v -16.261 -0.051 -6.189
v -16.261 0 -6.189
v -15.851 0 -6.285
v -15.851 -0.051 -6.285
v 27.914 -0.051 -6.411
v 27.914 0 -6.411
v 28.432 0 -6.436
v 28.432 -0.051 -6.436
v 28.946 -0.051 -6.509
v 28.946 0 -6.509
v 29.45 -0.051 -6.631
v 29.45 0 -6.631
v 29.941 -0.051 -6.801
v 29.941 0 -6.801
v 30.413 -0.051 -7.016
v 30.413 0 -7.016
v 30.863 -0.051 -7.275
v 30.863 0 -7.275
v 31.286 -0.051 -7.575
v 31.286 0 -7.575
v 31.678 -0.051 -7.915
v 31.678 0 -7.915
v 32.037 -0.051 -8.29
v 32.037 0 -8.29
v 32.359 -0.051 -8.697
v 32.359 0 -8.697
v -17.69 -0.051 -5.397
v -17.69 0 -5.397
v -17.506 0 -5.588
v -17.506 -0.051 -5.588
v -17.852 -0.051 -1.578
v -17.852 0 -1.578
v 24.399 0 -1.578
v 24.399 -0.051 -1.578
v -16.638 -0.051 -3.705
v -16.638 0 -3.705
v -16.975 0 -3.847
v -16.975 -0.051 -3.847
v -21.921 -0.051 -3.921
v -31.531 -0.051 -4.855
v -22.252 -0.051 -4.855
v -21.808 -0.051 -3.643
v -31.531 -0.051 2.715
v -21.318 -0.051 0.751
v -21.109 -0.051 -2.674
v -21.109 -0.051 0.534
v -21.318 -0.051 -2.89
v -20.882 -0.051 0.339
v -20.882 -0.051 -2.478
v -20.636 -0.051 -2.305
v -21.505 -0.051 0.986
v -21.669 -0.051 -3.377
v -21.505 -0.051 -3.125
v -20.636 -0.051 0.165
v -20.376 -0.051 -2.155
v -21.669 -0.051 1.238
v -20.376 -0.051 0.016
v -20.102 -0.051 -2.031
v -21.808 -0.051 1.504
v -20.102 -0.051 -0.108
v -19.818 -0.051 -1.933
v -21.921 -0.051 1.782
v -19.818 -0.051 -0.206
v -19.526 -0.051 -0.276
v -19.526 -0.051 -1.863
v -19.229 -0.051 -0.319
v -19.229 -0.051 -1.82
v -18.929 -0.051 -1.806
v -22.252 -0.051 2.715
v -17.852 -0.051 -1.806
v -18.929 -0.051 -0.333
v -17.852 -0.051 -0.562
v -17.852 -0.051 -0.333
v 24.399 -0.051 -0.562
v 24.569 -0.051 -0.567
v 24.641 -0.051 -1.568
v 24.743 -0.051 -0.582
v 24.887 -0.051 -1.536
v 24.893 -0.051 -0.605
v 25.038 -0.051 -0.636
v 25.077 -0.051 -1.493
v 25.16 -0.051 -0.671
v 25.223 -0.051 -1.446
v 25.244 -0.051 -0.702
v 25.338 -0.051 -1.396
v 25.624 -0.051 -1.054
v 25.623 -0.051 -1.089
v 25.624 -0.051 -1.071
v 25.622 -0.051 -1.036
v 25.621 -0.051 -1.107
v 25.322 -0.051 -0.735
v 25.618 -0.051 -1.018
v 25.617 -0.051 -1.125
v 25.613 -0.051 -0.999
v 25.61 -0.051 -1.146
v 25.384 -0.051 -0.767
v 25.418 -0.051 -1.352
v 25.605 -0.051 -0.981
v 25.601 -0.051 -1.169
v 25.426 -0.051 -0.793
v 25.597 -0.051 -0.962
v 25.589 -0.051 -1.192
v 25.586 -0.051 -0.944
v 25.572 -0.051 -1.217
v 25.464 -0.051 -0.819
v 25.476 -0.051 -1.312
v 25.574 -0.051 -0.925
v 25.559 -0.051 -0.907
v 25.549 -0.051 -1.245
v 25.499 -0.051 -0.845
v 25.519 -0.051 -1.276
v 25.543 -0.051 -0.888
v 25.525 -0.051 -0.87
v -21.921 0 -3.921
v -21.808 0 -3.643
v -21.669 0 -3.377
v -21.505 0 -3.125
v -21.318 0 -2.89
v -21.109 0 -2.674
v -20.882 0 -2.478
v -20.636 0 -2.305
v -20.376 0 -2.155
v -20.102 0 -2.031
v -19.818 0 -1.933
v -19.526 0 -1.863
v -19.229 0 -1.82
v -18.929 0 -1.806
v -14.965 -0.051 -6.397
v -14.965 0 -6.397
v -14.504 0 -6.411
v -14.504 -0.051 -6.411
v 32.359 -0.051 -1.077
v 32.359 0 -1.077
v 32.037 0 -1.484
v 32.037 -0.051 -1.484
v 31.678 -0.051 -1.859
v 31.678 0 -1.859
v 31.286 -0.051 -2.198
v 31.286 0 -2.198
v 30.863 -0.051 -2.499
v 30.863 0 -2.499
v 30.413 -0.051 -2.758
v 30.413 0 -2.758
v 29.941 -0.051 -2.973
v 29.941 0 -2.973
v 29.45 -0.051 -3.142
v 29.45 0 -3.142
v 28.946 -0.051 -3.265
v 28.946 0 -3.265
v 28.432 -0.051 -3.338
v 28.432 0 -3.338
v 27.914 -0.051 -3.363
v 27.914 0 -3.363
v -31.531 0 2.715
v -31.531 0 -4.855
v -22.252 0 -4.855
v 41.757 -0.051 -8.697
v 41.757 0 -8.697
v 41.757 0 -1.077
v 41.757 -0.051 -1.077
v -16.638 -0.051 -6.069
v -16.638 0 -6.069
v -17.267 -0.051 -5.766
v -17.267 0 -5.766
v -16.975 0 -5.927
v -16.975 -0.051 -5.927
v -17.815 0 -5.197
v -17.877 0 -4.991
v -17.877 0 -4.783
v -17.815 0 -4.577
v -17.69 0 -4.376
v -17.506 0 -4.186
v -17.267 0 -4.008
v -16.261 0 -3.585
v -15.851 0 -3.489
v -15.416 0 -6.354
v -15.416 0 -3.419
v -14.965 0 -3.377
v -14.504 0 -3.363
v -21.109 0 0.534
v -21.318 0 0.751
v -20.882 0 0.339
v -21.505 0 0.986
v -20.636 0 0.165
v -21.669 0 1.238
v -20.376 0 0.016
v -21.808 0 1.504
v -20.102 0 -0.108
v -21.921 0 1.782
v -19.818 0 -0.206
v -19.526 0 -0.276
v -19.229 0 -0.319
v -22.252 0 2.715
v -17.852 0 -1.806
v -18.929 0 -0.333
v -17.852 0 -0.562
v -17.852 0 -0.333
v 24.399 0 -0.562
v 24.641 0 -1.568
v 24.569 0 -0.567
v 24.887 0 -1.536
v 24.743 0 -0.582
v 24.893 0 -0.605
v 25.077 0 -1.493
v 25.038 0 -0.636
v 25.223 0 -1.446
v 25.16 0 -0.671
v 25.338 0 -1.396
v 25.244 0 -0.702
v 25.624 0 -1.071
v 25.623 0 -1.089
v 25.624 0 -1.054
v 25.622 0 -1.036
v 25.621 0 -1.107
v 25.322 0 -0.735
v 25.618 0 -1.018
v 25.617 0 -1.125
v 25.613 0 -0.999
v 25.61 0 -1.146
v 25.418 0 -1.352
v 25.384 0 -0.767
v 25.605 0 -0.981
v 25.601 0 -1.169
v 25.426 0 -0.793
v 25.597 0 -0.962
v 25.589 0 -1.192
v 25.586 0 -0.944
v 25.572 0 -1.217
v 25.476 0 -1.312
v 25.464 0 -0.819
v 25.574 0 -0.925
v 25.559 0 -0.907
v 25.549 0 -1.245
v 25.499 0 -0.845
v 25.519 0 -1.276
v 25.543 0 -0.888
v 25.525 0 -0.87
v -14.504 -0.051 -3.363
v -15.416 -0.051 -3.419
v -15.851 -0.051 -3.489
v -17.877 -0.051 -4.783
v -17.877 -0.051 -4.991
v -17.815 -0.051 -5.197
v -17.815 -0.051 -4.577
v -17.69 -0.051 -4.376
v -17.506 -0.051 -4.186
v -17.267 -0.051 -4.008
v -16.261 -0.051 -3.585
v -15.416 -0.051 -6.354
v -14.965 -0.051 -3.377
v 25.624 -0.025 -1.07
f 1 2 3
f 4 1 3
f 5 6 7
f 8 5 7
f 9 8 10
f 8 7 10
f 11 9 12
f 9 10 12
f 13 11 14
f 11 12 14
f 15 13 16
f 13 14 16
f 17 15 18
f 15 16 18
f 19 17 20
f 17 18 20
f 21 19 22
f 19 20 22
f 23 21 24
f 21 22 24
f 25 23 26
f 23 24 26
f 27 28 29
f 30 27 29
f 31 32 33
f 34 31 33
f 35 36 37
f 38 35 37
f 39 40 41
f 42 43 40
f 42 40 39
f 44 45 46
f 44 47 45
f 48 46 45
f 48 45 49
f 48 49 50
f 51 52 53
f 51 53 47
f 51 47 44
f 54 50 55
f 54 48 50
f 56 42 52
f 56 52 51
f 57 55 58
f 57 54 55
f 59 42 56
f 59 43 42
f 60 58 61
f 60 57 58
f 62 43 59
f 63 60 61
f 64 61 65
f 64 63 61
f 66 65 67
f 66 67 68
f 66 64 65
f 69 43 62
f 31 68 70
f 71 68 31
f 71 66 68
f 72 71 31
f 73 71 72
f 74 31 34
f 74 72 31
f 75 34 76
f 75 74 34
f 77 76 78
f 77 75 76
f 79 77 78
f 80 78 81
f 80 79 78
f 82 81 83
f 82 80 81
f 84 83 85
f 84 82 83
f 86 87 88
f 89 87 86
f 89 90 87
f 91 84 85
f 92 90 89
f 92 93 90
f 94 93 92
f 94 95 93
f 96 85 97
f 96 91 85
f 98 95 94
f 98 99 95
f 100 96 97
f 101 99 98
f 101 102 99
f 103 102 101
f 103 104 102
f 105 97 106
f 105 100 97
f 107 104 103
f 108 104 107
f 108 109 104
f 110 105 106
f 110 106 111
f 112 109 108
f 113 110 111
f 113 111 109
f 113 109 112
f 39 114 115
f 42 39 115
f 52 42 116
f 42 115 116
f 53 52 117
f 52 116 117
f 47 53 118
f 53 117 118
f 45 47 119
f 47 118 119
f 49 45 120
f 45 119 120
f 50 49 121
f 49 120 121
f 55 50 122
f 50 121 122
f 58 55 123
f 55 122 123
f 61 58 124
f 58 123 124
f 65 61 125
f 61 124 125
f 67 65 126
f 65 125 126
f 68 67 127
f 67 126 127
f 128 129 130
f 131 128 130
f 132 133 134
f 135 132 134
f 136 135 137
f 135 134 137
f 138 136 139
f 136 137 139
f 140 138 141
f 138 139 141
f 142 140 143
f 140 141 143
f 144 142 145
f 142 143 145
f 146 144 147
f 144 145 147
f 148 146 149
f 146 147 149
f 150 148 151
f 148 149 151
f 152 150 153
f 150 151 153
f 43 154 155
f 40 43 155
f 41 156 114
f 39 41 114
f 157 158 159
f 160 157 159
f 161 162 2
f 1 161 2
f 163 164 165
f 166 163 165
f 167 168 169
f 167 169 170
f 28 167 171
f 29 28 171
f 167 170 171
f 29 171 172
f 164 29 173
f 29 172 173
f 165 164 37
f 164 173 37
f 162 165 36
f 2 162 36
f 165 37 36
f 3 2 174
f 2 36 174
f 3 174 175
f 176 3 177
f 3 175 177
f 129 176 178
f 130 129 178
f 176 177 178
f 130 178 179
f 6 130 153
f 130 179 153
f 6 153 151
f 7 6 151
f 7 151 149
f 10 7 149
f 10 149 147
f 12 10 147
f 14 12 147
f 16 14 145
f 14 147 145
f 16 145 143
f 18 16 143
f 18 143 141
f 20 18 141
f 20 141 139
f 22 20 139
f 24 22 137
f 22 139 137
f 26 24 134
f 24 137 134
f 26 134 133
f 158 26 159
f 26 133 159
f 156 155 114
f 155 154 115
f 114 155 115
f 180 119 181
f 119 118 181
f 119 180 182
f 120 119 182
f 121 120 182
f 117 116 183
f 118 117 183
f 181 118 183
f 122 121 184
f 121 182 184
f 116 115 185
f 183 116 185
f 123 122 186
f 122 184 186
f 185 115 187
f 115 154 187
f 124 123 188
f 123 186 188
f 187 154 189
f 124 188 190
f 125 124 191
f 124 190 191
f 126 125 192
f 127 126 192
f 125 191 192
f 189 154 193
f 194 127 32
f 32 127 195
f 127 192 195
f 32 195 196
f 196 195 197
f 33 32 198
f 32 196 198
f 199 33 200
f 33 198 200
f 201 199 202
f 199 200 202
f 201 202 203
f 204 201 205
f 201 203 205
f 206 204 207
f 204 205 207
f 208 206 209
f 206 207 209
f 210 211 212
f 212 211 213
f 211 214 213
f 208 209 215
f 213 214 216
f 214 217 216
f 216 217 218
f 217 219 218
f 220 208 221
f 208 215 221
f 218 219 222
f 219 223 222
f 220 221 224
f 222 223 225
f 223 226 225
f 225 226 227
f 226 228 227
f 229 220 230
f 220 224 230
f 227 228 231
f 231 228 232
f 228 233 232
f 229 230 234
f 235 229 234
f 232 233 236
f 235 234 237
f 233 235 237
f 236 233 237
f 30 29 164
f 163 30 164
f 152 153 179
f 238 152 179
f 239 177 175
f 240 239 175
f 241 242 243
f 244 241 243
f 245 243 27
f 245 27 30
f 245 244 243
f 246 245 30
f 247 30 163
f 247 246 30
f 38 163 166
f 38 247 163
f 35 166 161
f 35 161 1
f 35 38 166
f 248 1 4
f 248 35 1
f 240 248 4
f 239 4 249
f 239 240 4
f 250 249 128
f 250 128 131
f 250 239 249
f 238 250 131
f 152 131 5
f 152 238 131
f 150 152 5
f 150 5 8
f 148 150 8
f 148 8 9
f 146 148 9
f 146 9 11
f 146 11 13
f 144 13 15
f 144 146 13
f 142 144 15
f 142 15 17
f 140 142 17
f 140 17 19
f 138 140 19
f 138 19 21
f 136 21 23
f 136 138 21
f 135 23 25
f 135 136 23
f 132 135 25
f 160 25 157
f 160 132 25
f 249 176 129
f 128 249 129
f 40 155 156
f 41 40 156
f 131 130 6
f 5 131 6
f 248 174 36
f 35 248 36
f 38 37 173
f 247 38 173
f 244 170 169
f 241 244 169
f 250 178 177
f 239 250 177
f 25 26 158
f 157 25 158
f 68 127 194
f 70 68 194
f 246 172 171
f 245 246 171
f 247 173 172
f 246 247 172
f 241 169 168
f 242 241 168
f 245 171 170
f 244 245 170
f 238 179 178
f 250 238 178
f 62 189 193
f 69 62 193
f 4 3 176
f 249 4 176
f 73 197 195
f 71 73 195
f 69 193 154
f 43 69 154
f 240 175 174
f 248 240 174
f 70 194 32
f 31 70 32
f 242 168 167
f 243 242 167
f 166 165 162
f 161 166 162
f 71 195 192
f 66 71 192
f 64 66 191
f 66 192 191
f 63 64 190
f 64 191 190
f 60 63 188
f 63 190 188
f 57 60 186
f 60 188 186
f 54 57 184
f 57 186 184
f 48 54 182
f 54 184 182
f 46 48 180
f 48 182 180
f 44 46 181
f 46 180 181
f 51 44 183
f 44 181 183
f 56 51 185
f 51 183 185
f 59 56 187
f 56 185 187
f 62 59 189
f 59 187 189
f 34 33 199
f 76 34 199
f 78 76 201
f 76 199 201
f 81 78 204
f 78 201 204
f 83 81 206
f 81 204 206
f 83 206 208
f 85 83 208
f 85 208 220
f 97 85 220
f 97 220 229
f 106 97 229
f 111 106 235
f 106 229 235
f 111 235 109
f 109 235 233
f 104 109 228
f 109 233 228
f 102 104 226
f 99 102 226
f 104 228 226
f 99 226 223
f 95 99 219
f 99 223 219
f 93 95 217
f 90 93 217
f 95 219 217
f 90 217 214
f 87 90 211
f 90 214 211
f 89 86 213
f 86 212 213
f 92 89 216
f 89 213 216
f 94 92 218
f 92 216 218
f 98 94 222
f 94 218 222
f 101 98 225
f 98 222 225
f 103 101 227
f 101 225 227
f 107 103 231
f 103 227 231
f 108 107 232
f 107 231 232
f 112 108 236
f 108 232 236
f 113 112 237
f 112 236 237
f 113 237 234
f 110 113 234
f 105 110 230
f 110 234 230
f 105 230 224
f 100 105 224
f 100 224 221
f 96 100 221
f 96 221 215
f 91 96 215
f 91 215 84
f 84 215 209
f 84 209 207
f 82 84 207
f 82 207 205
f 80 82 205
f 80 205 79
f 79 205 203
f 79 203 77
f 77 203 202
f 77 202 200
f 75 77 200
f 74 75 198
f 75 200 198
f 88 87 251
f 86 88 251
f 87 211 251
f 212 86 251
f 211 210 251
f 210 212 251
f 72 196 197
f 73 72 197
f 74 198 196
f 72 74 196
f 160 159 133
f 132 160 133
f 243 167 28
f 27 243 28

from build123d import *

# Parameters (mm, degrees)
F2_DEPTH = 0.0508


# Not quite as in the source:
# - ends of sketch curves that miss each other by under 0.0002 mm in the source are joined


with BuildPart() as f2:
    # F0 (on Front) → F2 (new body)
    with BuildSketch(Plane.XZ):
        with BuildLine():
            Line((-22.2519018109, 2.7154037545), (-31.5314531326, 2.7154037545))
            Line((-31.5314531326, 2.7154037545), (-31.5314531326, -4.8547233455))
            Line((-31.5314531326, -4.8547233455), (-22.2519018109, -4.8547233455))
            Line((-22.2519018109, -4.8547233455), (-21.9214119342, -3.9214320238))
            ThreePointArc((-21.9214119342, -3.9214320238), (-20.7609625105, -2.3884201716), (-18.9285192327, -1.8062519505))
            Line((-18.9285192327, -1.8062519505), (-17.8517878327, -1.8062519505))
            Line((-17.8517878327, -1.8062519505), (-17.8517878327, -1.577656713))
            Line((-17.8517878327, -1.577656713), (24.3993468673, -1.577656713))
            add(Edge.make_bspline(
                [(24.3993468673, -1.577656713), (25.6243397865, -1.577656713), (25.6243397865, -1.0696597955), (25.6243397865, -0.5616628779), (24.3993468673, -0.5616628779)],
                knots=[4.7123889804, 4.7123889804, 4.7123889804, 6.2831853072, 6.2831853072, 7.853981634, 7.853981634, 7.853981634], degree=2, weights=[1, 0.7071067812, 1, 0.7071067812, 1]))
            Line((24.3993468673, -0.5616628779), (-17.8517878327, -0.5616628779))
            Line((-17.8517878327, -0.5616628779), (-17.8517878327, -0.3330676404))
            Line((-17.8517878327, -0.3330676404), (-18.9285192327, -0.3330676404))
            ThreePointArc((-18.9285192327, -0.3330676404), (-20.7609625105, 0.2491005807), (-21.9214119342, 1.7821124329))
            Line((-21.9214119342, 1.7821124329), (-22.2519018109, 2.7154037545))
        make_face()
    extrude(amount=F2_DEPTH)


with BuildPart() as f2b:
    # F1 (on Front) → F2, piece 2 (new body)
    with BuildSketch(Plane.XZ):
        with BuildLine():
            Line((27.9137630355, -3.3628604373), (-14.5042369645, -3.3628604373))
            Line((-14.5042369645, -3.3628604373), (-14.9646373645, -3.3770590373))
            Line((-14.9646373645, -3.3770590373), (-15.4164525645, -3.4193754373))
            Line((-15.4164525645, -3.4193754373), (-15.8512751645, -3.4890222373))
            Line((-15.8512751645, -3.4890222373), (-16.2610025645, -3.5847294373))
            Line((-16.2610025645, -3.5847294373), (-16.6380147645, -3.7046682373))
            Line((-16.6380147645, -3.7046682373), (-16.9752759645, -3.8466542373))
            Line((-16.9752759645, -3.8466542373), (-17.2665123645, -4.0079950373))
            Line((-17.2665123645, -4.0079950373), (-17.5062883645, -4.1857188373))
            Line((-17.5062883645, -4.1857188373), (-17.6901335645, -4.3764982373))
            Line((-17.6901335645, -4.3764982373), (-17.8146443645, -4.5768026373))
            Line((-17.8146443645, -4.5768026373), (-17.8774585645, -4.7828474373))
            Line((-17.8774585645, -4.7828474373), (-17.8774585645, -4.9908734373))
            Line((-17.8774585645, -4.9908734373), (-17.8146443645, -5.1969182373))
            Line((-17.8146443645, -5.1969182373), (-17.6901335645, -5.3972226373))
            Line((-17.6901335645, -5.3972226373), (-17.5062883645, -5.5880020373))
            Line((-17.5062883645, -5.5880020373), (-17.2665123645, -5.7657258373))
            Line((-17.2665123645, -5.7657258373), (-16.9752759645, -5.9270666373))
            Line((-16.9752759645, -5.9270666373), (-16.6380147645, -6.0690526373))
            Line((-16.6380147645, -6.0690526373), (-16.2610025645, -6.1889914373))
            Line((-16.2610025645, -6.1889914373), (-15.8512751645, -6.2846986373))
            Line((-15.8512751645, -6.2846986373), (-15.4164525645, -6.3543454373))
            Line((-15.4164525645, -6.3543454373), (-14.9646373645, -6.3966618373))
            Line((-14.9646373645, -6.3966618373), (-14.5042369645, -6.4108604373))
            Line((-14.5042369645, -6.4108604373), (27.9137630355, -6.4108604373))
            ThreePointArc((27.9137630355, -6.4108604373), (30.4129542245, -7.0158501043), (32.3587639958, -8.6968597505))
            Line((32.3587639958, -8.6968597505), (41.7567630355, -8.6968604373))
            Line((41.7567630355, -8.6968604373), (41.7567630355, -1.0768604373))
            Line((41.7567630355, -1.0768604373), (32.3587630355, -1.0768604373))
            ThreePointArc((32.3587630355, -1.0768604373), (30.4129542245, -2.7578707702), (27.9137630355, -3.3628604373))
        make_face()
    extrude(amount=F2_DEPTH)


solid = Compound([f2.part, f2b.part])
